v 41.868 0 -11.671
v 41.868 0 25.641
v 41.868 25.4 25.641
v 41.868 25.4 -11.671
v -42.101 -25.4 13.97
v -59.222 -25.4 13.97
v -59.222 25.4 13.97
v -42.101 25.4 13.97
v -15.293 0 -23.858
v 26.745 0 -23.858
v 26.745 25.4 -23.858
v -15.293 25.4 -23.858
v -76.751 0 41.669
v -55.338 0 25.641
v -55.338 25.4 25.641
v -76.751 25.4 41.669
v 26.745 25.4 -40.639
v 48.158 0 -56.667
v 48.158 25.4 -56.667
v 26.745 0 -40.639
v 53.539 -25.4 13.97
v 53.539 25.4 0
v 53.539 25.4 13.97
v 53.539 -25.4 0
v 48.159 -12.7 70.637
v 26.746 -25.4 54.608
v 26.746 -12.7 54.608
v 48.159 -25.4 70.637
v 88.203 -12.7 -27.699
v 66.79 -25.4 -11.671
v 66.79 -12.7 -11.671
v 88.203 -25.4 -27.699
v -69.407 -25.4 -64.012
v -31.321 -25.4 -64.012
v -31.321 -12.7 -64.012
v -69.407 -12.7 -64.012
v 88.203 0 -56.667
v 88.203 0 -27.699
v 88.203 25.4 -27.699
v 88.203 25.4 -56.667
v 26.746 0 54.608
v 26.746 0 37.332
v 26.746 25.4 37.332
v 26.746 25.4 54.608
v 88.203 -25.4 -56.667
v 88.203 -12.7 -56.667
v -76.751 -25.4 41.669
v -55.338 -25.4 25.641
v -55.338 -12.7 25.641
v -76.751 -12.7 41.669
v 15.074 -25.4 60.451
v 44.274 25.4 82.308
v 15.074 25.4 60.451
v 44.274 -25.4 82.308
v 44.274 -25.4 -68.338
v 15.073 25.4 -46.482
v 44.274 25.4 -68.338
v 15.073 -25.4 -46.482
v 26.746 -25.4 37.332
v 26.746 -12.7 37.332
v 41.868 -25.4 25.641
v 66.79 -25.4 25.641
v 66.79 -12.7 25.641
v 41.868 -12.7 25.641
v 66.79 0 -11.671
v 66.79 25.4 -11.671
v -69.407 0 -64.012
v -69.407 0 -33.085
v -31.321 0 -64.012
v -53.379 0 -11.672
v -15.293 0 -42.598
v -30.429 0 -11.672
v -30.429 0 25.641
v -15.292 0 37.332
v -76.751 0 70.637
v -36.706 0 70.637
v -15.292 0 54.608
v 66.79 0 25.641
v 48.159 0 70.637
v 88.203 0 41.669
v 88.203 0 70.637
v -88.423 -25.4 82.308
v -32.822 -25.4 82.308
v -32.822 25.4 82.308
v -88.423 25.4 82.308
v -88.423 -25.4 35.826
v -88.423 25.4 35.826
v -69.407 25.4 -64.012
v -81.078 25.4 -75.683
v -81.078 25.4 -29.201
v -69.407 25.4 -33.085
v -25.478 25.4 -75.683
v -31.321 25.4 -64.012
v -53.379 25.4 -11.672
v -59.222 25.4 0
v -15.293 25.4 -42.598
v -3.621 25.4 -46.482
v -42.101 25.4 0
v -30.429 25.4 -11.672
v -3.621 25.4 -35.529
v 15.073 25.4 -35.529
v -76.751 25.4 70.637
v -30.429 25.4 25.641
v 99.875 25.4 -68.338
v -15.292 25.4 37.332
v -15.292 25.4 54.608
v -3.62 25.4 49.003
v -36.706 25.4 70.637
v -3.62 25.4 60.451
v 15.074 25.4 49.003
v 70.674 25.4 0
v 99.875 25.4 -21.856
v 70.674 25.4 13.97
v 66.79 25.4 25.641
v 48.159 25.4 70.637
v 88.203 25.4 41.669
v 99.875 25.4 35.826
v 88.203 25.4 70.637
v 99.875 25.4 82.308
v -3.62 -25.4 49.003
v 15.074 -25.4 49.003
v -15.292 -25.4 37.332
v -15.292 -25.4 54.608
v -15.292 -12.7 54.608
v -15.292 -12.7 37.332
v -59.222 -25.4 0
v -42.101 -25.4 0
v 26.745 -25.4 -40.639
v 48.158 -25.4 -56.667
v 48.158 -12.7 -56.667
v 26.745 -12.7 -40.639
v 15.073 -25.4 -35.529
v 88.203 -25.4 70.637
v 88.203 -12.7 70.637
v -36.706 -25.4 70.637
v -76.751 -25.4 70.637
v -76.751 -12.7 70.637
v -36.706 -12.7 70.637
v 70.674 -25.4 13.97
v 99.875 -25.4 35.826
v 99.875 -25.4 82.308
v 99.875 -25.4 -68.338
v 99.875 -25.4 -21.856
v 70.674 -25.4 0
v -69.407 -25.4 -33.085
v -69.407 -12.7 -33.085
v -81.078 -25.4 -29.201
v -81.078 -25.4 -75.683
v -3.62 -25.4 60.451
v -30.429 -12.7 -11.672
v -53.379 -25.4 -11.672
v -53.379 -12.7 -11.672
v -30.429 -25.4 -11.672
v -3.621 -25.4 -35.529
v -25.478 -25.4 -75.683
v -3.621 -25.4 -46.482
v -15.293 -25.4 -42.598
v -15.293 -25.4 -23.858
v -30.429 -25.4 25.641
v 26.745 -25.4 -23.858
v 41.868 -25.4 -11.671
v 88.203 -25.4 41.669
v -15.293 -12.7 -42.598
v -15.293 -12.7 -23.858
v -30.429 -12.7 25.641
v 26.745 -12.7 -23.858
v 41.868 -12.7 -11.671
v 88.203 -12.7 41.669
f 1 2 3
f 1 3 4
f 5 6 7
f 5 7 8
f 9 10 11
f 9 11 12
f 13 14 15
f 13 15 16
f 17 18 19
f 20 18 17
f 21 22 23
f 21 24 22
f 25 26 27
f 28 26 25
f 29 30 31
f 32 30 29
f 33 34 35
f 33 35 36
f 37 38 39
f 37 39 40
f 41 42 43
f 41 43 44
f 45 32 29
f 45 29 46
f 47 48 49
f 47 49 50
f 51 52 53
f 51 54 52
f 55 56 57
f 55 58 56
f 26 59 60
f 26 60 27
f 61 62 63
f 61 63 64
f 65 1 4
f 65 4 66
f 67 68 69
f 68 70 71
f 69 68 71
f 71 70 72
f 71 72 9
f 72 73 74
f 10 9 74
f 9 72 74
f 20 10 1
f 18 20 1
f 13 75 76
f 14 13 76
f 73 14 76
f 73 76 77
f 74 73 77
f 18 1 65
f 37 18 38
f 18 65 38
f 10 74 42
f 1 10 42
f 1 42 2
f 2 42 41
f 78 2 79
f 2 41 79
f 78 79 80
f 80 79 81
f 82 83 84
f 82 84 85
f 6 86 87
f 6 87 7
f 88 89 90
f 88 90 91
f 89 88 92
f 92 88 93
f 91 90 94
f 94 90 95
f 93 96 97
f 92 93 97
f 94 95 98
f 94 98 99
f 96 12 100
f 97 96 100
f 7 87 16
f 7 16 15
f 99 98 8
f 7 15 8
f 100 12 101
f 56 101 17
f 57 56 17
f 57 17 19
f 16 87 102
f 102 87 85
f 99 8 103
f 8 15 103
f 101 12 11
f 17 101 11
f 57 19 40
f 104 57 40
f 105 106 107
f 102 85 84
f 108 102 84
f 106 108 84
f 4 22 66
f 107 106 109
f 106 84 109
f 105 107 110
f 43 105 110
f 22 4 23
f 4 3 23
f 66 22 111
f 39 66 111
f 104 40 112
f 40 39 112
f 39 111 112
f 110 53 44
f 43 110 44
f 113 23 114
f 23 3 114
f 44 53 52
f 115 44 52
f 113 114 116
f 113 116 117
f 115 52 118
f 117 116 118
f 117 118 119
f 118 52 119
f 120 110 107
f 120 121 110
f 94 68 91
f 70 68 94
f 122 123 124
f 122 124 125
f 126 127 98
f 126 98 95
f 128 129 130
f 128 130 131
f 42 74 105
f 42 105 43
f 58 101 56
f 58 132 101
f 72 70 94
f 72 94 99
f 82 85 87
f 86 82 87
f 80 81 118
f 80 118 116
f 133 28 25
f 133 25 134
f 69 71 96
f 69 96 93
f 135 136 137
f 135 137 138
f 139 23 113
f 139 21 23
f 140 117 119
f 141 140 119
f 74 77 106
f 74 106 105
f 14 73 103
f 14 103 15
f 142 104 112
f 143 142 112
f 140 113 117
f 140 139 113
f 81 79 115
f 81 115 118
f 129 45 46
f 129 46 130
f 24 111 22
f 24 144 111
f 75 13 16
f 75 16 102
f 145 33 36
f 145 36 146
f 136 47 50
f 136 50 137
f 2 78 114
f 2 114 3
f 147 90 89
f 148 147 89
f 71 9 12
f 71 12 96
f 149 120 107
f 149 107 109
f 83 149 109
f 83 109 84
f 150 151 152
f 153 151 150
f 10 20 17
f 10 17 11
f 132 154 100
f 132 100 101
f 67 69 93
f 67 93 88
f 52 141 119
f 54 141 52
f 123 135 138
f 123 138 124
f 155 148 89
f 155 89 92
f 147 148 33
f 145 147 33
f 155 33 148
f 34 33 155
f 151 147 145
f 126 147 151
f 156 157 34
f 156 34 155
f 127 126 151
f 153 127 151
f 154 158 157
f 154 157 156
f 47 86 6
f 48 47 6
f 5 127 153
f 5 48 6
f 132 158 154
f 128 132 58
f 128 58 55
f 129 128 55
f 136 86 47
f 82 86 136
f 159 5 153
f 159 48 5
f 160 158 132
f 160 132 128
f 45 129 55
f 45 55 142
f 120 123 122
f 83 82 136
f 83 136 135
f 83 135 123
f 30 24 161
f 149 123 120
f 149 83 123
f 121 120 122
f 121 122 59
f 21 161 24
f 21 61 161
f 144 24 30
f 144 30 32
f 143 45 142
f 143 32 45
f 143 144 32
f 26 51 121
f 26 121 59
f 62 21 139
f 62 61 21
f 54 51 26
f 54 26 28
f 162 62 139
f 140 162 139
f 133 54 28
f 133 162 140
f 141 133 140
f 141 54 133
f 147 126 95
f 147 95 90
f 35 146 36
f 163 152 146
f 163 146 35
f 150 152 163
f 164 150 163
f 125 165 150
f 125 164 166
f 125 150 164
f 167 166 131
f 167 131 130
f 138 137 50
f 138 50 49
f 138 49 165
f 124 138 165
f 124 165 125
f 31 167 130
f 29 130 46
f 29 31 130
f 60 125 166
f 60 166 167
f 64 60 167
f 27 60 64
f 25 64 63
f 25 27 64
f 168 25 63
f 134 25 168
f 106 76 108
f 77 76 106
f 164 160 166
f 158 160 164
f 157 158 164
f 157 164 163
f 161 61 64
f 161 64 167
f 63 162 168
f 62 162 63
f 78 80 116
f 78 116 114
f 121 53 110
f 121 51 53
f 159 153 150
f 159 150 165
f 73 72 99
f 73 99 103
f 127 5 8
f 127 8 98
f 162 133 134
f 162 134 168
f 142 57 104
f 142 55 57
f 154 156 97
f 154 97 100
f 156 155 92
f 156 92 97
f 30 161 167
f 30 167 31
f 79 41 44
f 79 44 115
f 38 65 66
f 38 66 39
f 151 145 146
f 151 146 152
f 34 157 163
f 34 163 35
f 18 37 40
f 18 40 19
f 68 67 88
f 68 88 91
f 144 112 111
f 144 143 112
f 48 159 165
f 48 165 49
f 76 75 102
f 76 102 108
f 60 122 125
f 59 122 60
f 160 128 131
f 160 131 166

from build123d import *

# Parameters (mm, degrees)
F1_DEPTH = 12.7
F2_DEPTH = 25.4


with BuildPart() as f1:
    # F0 (on Front) → F1 (new body)
    with BuildSketch(Plane.XZ):
        Polygon((-30.429008, 25.641112), (-30.429008, -11.671882), (-53.379117, -11.671882), (-69.406818, -33.085297), (-69.406818, -64.011575), (-31.320526, -64.011575), (-15.292825, -42.598161), (-15.292825, -23.857851), (26.74457, -23.857851), (26.74457, -40.639478), (48.158187, -56.666891), (88.203151, -56.666891), (88.203151, -27.699199), (66.789736, -11.671497), (41.867928, -11.671497), (41.867928, 25.641497), (66.789822, 25.641497), (88.203439, 41.66891), (88.203439, 70.636506), (48.158778, 70.636506), (26.74588, 54.608069), (26.74588, 37.331953), (-15.291514, 37.331953), (-15.291514, 54.607823), (-36.70624, 70.636506), (-76.751118, 70.636506), (-76.751118, 41.668814), (-55.337703, 25.641112), align=None)
    extrude(amount=F1_DEPTH)

    # F0 (on Front) → F2 (join, symmetric)
    with BuildSketch(Plane.XZ):
        Polygon((15.074383, 49.003451), (-3.620017, 49.003451), (-3.620017, 60.450634), (-32.822015, 82.308003), (-88.422615, 82.308003), (-88.422615, 35.826003), (-59.221928, 13.969615), (-42.100506, 13.969615), (-42.100506, -0.000385), (-59.221928, -0.000385), (-81.078316, -29.201073), (-81.078316, -75.683073), (-25.477716, -75.683073), (-3.621328, -46.482385), (-3.621328, -35.529348), (15.073072, -35.529348), (15.073072, -46.482385), (44.274048, -68.338388), (99.874648, -68.338388), (99.874648, -21.856388), (70.673961, 0), (53.539425, 0), (53.539425, 13.97), (70.673961, 13.97), (99.874936, 35.826003), (99.874936, 82.308003), (44.274336, 82.308003), (15.074383, 60.450634), align=None)
        Polygon((-53.379117, -11.671882), (-30.429008, -11.671882), (-30.429008, 25.641112), (-55.337703, 25.641112), (-76.751118, 41.668814), (-76.751118, 70.636506), (-36.70624, 70.636506), (-15.291514, 54.607823), (-15.291514, 37.331953), (26.74588, 37.331953), (26.74588, 54.608069), (48.158778, 70.636506), (88.203439, 70.636506), (88.203439, 41.66891), (66.789822, 25.641497), (41.867928, 25.641497), (41.867928, -11.671497), (66.789736, -11.671497), (88.203151, -27.699199), (88.203151, -56.666891), (48.158187, -56.666891), (26.74457, -40.639478), (26.74457, -23.857851), (-15.292825, -23.857851), (-15.292825, -42.598161), (-31.320526, -64.011575), (-69.406818, -64.011575), (-69.406818, -33.085297), align=None, mode=Mode.SUBTRACT)
    extrude(amount=F2_DEPTH, both=True)


solid = f1.part
